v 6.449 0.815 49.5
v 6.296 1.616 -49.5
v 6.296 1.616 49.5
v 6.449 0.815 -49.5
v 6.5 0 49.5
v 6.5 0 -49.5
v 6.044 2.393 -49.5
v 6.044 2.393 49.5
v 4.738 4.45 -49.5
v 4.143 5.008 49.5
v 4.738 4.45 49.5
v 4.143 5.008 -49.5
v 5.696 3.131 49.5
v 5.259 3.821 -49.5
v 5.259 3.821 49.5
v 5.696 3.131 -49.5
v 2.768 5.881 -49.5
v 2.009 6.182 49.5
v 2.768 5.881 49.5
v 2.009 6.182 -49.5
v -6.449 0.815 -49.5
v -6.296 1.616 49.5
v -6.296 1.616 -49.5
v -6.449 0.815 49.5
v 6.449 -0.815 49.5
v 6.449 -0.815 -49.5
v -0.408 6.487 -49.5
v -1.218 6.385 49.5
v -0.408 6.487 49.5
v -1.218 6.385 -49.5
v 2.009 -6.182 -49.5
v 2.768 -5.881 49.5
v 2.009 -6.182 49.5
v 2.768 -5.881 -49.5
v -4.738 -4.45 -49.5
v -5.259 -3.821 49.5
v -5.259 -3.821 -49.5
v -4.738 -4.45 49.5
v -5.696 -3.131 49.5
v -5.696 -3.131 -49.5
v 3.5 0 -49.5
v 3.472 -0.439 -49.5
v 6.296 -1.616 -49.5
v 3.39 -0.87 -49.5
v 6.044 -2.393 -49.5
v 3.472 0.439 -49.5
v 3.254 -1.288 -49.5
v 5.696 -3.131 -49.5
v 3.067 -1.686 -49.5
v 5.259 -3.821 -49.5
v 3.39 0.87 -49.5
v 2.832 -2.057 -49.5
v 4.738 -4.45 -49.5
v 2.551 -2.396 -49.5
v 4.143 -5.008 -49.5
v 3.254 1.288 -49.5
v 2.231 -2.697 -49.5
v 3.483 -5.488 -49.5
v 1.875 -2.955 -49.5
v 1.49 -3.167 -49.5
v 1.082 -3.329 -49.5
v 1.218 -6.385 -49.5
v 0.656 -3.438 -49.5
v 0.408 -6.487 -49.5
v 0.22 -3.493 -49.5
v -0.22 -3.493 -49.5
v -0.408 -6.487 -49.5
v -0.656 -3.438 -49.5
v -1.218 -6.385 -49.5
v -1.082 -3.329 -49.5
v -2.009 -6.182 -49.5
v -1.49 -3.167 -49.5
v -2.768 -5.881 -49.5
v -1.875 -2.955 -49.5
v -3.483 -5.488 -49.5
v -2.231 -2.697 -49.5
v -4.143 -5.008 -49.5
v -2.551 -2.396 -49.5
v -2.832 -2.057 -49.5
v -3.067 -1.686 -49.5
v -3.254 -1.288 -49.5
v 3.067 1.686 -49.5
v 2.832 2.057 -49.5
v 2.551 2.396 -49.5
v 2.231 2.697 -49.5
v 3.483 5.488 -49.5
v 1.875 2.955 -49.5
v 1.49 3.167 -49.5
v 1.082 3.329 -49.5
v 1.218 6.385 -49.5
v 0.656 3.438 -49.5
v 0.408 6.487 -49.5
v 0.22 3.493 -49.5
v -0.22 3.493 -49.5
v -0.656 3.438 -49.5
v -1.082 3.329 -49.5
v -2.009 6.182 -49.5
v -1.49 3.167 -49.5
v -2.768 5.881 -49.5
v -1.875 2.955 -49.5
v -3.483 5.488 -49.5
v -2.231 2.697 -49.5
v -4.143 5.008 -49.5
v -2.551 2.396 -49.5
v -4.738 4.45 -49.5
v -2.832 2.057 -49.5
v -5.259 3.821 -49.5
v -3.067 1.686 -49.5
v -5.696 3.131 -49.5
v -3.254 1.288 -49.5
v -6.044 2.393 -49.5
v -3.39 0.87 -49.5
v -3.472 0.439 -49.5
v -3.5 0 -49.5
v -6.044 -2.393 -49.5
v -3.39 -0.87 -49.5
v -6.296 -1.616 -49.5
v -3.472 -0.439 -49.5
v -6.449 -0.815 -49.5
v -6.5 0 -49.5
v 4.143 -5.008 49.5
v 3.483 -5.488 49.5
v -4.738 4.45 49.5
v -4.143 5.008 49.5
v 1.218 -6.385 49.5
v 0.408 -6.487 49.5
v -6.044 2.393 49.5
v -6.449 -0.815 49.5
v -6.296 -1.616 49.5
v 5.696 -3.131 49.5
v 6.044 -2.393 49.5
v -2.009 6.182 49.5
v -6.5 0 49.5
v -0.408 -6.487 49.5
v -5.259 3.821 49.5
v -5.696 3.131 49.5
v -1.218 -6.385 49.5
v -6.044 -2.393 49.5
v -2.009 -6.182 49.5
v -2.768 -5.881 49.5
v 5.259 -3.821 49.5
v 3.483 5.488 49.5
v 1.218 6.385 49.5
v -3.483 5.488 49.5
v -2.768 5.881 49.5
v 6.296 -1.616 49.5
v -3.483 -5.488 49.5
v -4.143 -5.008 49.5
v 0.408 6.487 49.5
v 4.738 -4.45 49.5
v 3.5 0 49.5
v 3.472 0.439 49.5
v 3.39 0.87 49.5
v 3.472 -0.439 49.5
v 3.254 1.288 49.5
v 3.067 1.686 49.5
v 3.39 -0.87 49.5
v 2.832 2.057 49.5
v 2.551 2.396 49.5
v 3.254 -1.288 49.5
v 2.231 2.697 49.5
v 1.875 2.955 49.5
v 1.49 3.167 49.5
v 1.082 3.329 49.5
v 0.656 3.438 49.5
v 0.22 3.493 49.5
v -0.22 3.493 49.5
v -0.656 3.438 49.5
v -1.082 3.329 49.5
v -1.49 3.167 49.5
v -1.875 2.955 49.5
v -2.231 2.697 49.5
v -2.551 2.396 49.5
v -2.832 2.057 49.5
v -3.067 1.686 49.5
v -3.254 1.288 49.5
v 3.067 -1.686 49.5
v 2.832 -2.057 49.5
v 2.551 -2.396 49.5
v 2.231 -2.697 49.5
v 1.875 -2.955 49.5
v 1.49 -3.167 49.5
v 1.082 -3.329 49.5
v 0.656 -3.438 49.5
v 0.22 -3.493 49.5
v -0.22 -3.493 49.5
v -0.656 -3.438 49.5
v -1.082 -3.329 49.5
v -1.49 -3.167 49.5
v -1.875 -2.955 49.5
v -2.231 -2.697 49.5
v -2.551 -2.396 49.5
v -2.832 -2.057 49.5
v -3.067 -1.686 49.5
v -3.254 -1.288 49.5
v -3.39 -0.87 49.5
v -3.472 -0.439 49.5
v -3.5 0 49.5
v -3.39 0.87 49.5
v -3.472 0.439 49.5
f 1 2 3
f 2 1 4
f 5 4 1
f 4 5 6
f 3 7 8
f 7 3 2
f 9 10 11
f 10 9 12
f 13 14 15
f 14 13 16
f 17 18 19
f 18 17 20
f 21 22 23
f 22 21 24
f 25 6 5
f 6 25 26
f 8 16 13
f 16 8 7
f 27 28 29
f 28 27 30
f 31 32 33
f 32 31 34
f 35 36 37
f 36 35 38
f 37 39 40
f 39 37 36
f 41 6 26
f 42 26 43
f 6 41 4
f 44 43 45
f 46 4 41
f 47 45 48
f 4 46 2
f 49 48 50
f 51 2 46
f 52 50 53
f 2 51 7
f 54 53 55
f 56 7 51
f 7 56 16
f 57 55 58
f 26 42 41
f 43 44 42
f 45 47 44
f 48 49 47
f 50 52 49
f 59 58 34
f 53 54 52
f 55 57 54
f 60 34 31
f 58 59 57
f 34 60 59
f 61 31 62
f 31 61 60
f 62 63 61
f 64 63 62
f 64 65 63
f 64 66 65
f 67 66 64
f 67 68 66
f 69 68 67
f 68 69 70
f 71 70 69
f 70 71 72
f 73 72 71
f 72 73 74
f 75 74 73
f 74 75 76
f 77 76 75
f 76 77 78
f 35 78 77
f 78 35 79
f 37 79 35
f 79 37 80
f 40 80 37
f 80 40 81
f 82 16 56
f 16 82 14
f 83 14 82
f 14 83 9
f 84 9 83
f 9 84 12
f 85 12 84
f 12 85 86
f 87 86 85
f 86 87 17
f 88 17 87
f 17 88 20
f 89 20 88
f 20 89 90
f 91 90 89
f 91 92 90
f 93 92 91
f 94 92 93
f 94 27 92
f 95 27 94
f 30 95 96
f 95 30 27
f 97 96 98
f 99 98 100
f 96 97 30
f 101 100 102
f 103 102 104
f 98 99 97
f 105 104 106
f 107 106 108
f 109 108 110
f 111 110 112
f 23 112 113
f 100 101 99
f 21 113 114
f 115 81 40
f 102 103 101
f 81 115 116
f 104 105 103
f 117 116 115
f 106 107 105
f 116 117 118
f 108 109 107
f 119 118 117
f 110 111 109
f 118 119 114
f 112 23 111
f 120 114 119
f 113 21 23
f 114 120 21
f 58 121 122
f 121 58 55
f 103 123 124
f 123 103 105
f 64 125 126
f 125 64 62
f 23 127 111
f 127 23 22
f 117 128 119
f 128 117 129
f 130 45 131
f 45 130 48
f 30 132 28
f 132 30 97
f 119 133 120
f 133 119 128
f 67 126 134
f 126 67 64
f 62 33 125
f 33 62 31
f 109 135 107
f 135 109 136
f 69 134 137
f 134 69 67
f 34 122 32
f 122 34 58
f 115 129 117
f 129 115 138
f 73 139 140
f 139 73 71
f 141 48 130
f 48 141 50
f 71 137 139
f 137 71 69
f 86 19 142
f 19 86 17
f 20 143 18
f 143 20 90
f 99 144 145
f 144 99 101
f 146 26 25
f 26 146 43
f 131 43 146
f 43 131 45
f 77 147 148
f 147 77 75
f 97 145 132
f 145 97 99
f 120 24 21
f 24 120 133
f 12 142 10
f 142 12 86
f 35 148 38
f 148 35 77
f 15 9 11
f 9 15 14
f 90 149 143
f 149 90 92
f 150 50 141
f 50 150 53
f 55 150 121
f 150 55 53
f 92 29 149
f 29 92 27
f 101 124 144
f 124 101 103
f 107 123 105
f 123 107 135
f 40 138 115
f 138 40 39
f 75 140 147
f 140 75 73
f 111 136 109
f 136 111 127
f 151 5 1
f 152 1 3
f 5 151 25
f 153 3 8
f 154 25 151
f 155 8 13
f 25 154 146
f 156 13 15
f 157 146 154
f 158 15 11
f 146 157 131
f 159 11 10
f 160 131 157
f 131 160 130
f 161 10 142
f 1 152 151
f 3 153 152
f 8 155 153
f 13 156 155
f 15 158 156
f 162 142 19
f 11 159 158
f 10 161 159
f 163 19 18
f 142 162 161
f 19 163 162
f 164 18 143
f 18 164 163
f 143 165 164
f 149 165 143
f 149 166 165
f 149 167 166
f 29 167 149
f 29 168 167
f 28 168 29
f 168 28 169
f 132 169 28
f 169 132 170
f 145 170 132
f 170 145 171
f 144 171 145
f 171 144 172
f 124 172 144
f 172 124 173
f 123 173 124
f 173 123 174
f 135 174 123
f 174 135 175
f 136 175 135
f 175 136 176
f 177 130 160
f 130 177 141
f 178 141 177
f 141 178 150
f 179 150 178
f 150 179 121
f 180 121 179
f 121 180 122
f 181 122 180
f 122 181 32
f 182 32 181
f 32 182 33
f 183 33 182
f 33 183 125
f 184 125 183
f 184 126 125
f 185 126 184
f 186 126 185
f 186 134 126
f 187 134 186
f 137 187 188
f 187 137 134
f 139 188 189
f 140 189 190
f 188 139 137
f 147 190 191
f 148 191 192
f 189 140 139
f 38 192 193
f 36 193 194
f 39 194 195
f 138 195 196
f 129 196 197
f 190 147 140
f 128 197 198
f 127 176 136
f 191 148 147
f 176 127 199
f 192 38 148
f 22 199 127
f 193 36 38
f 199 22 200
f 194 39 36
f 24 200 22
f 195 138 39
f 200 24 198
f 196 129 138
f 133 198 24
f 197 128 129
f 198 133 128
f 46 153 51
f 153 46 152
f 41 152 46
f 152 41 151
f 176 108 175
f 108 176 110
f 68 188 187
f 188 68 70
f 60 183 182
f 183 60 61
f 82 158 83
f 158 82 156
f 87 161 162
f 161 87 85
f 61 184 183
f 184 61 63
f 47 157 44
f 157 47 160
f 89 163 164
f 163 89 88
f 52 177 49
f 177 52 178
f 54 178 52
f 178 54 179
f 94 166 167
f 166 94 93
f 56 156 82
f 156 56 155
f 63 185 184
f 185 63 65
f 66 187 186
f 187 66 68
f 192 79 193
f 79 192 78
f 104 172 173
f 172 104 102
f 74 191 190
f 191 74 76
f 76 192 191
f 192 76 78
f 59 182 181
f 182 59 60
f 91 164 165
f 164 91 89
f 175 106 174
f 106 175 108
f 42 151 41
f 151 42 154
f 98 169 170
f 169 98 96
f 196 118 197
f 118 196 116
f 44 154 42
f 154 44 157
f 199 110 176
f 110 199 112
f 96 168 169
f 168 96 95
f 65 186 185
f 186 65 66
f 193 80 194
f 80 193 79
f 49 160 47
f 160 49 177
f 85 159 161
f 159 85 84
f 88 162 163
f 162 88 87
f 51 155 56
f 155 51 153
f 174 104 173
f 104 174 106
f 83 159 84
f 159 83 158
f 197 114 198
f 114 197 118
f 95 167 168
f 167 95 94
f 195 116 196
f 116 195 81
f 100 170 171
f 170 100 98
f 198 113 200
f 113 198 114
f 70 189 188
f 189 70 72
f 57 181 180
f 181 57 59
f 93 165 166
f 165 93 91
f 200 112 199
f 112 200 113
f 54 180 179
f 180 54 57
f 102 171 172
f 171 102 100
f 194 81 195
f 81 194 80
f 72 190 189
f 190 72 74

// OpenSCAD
$fn = 50;


difference() {
	union() {
		translate(v = [0, 0, -49.5000000000]) {
			cylinder(h = 99, r = 6.5000000000);
		}
	}
	union() {
		translate(v = [0, 0, -100.0000000000]) {
			cylinder(h = 200, r = 3.5000000000);
		}
	}
}
